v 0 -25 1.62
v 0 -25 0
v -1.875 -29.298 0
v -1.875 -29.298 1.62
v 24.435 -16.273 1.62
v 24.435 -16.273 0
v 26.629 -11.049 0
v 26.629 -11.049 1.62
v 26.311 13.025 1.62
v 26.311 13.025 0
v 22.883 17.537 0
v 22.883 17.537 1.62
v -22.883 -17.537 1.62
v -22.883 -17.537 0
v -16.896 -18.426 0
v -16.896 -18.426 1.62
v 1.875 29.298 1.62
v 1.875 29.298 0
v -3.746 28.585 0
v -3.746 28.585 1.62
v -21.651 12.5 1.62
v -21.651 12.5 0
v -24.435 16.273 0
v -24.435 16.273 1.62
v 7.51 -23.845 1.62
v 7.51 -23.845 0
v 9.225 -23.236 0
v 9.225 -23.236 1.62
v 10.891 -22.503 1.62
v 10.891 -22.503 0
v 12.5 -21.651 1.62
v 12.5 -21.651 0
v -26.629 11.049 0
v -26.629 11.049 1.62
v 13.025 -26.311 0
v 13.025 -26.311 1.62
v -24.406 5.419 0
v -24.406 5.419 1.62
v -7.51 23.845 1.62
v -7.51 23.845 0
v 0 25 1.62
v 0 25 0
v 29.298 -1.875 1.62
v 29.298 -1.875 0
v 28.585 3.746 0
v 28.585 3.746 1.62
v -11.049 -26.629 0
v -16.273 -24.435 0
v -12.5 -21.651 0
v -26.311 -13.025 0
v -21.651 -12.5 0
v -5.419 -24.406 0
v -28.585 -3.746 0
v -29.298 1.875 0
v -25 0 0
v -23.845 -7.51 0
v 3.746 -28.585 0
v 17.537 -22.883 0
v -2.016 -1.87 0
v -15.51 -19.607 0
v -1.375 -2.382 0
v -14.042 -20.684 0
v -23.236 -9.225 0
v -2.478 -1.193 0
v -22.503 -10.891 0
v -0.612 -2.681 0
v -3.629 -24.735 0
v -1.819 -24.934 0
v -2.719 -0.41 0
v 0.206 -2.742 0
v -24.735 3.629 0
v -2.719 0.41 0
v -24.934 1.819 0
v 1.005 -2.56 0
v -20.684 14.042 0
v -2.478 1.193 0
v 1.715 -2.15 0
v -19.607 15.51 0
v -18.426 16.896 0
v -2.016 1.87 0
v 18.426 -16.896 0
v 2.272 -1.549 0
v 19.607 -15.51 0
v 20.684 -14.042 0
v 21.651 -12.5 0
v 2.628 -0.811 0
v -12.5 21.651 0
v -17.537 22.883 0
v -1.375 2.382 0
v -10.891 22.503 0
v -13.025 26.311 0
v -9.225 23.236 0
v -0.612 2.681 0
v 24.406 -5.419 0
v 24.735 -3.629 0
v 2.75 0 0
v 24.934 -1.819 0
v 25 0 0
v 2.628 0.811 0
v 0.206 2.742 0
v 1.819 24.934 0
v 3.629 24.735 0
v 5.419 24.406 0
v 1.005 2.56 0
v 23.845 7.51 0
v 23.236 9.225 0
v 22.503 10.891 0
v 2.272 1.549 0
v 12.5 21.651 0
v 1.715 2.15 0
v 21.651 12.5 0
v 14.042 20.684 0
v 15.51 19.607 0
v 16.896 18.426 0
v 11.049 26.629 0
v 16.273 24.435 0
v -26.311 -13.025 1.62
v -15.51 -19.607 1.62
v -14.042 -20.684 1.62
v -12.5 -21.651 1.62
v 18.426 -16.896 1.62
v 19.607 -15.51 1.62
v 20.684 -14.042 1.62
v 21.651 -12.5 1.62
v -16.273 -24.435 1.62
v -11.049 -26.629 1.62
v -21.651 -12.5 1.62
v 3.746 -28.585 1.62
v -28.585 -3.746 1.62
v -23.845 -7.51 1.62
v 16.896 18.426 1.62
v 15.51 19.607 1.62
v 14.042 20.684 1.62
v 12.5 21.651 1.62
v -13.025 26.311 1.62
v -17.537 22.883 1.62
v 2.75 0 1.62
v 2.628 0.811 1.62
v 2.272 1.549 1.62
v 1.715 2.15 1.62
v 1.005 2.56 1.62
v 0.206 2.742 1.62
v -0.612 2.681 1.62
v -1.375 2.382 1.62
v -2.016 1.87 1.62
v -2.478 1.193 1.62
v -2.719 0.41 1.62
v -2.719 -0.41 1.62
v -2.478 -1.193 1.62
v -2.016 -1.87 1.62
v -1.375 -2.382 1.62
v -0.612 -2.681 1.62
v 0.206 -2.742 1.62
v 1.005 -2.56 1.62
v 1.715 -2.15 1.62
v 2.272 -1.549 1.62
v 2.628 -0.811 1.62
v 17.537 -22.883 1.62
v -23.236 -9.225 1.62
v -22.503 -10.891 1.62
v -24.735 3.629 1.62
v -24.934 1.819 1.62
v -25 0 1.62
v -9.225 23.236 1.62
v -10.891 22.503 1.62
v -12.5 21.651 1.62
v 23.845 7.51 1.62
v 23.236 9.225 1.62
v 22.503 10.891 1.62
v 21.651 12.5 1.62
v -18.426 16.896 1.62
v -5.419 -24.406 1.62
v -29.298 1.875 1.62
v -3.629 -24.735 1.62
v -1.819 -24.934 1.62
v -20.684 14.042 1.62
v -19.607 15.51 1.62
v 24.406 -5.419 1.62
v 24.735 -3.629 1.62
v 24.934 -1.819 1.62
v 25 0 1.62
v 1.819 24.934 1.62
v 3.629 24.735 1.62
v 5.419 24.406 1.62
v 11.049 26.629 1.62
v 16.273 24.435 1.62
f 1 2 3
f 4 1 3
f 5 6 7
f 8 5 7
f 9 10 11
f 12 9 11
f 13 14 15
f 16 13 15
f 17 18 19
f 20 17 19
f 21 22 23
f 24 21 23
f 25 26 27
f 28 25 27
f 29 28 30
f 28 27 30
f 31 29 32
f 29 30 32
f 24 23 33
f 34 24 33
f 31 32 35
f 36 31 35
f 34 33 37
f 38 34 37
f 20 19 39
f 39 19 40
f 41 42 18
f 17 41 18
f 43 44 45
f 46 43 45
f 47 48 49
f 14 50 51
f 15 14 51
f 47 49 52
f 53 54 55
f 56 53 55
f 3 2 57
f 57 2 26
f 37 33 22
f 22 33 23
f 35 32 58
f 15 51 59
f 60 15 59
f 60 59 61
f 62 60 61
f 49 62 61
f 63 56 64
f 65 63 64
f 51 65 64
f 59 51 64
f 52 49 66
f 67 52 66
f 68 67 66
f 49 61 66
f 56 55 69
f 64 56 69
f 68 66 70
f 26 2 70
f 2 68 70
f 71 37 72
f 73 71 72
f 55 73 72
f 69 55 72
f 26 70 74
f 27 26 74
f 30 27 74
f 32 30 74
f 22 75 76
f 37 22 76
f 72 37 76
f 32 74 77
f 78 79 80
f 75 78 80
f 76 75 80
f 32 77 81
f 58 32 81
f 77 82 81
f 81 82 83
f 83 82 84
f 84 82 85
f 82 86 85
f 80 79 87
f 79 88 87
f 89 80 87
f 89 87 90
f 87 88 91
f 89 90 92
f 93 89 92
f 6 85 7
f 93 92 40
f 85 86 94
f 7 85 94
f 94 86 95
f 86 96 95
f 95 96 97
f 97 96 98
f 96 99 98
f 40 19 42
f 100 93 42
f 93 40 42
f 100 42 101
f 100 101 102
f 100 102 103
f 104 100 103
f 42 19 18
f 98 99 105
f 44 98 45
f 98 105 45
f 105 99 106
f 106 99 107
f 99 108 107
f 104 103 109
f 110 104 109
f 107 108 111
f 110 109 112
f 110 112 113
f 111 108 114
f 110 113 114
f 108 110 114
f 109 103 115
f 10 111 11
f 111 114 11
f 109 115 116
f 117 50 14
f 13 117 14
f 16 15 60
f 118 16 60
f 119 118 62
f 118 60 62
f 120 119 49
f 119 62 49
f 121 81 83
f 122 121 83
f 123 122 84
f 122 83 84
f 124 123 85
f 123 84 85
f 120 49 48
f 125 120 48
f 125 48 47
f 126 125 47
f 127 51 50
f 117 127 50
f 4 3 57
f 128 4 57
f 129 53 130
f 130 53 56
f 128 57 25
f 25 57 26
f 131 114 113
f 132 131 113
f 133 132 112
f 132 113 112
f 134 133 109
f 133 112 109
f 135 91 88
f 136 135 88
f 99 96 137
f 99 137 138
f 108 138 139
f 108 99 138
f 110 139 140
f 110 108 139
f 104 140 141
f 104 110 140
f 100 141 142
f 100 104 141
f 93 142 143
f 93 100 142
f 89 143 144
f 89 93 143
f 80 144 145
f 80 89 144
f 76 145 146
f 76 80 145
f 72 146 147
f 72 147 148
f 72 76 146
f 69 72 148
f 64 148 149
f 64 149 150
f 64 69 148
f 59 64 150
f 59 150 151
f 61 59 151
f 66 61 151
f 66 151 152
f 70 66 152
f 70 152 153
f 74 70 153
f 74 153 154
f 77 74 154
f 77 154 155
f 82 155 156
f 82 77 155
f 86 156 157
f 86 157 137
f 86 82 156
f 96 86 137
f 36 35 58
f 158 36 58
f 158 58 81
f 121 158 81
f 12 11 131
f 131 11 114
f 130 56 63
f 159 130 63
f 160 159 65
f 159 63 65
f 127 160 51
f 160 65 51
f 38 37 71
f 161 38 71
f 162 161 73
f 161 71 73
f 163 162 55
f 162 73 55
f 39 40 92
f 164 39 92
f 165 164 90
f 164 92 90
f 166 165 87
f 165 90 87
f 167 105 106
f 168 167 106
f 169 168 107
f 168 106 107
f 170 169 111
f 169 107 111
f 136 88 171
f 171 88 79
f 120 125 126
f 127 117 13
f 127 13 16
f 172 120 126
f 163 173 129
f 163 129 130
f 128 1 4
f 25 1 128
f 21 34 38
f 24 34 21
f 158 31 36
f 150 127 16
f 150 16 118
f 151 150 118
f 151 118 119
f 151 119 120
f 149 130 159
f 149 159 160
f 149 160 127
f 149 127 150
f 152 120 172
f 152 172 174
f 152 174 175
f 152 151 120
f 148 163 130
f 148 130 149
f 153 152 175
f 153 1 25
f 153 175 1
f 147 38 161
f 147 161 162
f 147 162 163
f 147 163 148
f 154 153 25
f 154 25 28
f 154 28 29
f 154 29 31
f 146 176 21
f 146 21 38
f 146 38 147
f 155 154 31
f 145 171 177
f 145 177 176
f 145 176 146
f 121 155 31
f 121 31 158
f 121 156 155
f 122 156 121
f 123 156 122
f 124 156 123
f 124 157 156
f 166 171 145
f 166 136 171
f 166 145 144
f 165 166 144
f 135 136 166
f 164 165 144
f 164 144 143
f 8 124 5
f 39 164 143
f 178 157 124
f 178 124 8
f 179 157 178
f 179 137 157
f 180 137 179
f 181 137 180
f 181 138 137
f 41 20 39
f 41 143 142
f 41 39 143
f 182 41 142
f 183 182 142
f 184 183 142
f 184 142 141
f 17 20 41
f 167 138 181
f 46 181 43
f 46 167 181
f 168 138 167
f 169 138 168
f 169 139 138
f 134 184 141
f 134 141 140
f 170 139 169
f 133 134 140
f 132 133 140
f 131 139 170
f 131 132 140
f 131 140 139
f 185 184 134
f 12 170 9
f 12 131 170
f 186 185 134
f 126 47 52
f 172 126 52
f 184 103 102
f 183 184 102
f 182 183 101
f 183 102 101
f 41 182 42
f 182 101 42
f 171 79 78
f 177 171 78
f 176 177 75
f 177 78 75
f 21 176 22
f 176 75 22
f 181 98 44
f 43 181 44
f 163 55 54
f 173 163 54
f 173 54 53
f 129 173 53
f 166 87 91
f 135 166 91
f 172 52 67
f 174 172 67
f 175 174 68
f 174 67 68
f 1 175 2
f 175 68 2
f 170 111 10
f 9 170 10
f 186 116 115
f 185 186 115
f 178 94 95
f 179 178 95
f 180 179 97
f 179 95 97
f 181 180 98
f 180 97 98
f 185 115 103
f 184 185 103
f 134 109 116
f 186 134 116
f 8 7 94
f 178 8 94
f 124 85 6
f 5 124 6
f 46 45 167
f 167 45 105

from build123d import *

# Parameters (mm, degrees)
F0_R     = 2.75
F1_DEPTH = 1.62


with BuildPart() as f1:
    # F0 (on Top) → F1 (new body)
    with BuildSketch(Plane.XY):
        with BuildLine():
            ThreePointArc((24.405646, -5.418899), (24.850967, -2.725698), (25, 0))
            ThreePointArc((25, 0), (24.709654, 3.799081), (23.845358, 7.509919))
            ThreePointArc((23.845358, 7.509919), (22.884418, 10.06496), (21.650635, 12.5))
            ThreePointArc((21.650635, 12.5), (19.499647, 15.644928), (16.895727, 18.42646))
            ThreePointArc((16.895727, 18.42646), (14.786007, 20.15872), (12.5, 21.650635))
            ThreePointArc((12.5, 21.650635), (9.064726, 23.298728), (5.418899, 24.405646))
            ThreePointArc((5.418899, 24.405646), (2.725698, 24.850967), (0, 25))
            ThreePointArc((0, 25), (-3.799081, 24.709654), (-7.509919, 23.845358))
            ThreePointArc((-7.509919, 23.845358), (-10.06496, 22.884418), (-12.5, 21.650635))
            ThreePointArc((-12.5, 21.650635), (-15.644928, 19.499647), (-18.42646, 16.895727))
            ThreePointArc((-18.42646, 16.895727), (-20.15872, 14.786007), (-21.650635, 12.5))
            ThreePointArc((-21.650635, 12.5), (-23.298728, 9.064726), (-24.405646, 5.418899))
            ThreePointArc((-24.405646, 5.418899), (-24.850967, 2.725698), (-25, 0))
            ThreePointArc((-25, 0), (-24.709654, -3.799081), (-23.845358, -7.509919))
            ThreePointArc((-23.845358, -7.509919), (-22.884418, -10.06496), (-21.650635, -12.5))
            ThreePointArc((-21.650635, -12.5), (-19.499647, -15.644928), (-16.895727, -18.42646))
            ThreePointArc((-16.895727, -18.42646), (-14.786007, -20.15872), (-12.5, -21.650635))
            ThreePointArc((-12.5, -21.650635), (-9.064726, -23.298728), (-5.418899, -24.405646))
            ThreePointArc((-5.418899, -24.405646), (-2.725698, -24.850967), (0, -25))
            ThreePointArc((0, -25), (3.799081, -24.709654), (7.509919, -23.845358))
            ThreePointArc((7.509919, -23.845358), (10.06496, -22.884418), (12.5, -21.650635))
            ThreePointArc((12.5, -21.650635), (15.644928, -19.499647), (18.42646, -16.895727))
            ThreePointArc((18.42646, -16.895727), (20.15872, -14.786007), (21.650635, -12.5))
            ThreePointArc((21.650635, -12.5), (23.298728, -9.064726), (24.405646, -5.418899))
        make_face()
        Circle(F0_R, mode=Mode.SUBTRACT)
        with BuildLine():
            ThreePointArc((-7.509919, 23.845358), (-3.799081, 24.709654), (0, 25))
            Line((0, 25), (1.87548, 29.298078))
            Line((1.87548, 29.298078), (-3.745994, 28.585496))
            Line((-3.745994, 28.585496), (-7.509919, 23.845358))
        make_face()
        with BuildLine():
            ThreePointArc((-18.42646, 16.895727), (-15.644928, 19.499647), (-12.5, 21.650635))
            Line((-12.5, 21.650635), (-13.024826, 26.31062))
            Line((-13.024826, 26.31062), (-17.536874, 22.882769))
            Line((-17.536874, 22.882769), (-18.42646, 16.895727))
        make_face()
        with BuildLine():
            ThreePointArc((-24.405646, 5.418899), (-23.298728, 9.064726), (-21.650635, 12.5))
            Line((-21.650635, 12.5), (-24.43514, 16.273252))
            Line((-24.43514, 16.273252), (-26.628763, 11.048622))
            Line((-26.628763, 11.048622), (-24.405646, 5.418899))
        make_face()
        with BuildLine():
            Line((-28.585496, -3.745994), (-23.845358, -7.509919))
            ThreePointArc((-23.845358, -7.509919), (-24.709654, -3.799081), (-25, 0))
            Line((-25, 0), (-29.298078, 1.87548))
            Line((-29.298078, 1.87548), (-28.585496, -3.745994))
        make_face()
        with BuildLine():
            ThreePointArc((23.845358, 7.509919), (24.709654, 3.799081), (25, 0))
            Line((25, 0), (29.298078, -1.87548))
            Line((29.298078, -1.87548), (28.585496, 3.745994))
            Line((28.585496, 3.745994), (23.845358, 7.509919))
        make_face()
        with BuildLine():
            Line((26.628763, -11.048622), (24.405646, -5.418899))
            ThreePointArc((24.405646, -5.418899), (23.298728, -9.064726), (21.650635, -12.5))
            Line((21.650635, -12.5), (24.43514, -16.273252))
            Line((24.43514, -16.273252), (26.628763, -11.048622))
        make_face()
        with BuildLine():
            Line((-22.882769, -17.536874), (-16.895727, -18.42646))
            ThreePointArc((-16.895727, -18.42646), (-19.499647, -15.644928), (-21.650635, -12.5))
            Line((-21.650635, -12.5), (-26.31062, -13.024826))
            Line((-26.31062, -13.024826), (-22.882769, -17.536874))
        make_face()
        with BuildLine():
            Line((-11.048622, -26.628763), (-5.418899, -24.405646))
            ThreePointArc((-5.418899, -24.405646), (-9.064726, -23.298728), (-12.5, -21.650635))
            Line((-12.5, -21.650635), (-16.273252, -24.43514))
            Line((-16.273252, -24.43514), (-11.048622, -26.628763))
        make_face()
        with BuildLine():
            Line((3.745994, -28.585496), (7.509919, -23.845358))
            ThreePointArc((7.509919, -23.845358), (3.799081, -24.709654), (0, -25))
            Line((0, -25), (-1.87548, -29.298078))
            Line((-1.87548, -29.298078), (3.745994, -28.585496))
        make_face()
        with BuildLine():
            Line((17.536874, -22.882769), (18.42646, -16.895727))
            ThreePointArc((18.42646, -16.895727), (15.644928, -19.499647), (12.5, -21.650635))
            Line((12.5, -21.650635), (13.024826, -26.31062))
            Line((13.024826, -26.31062), (17.536874, -22.882769))
        make_face()
        with BuildLine():
            ThreePointArc((5.418899, 24.405646), (9.064726, 23.298728), (12.5, 21.650635))
            Line((12.5, 21.650635), (16.273252, 24.43514))
            Line((16.273252, 24.43514), (11.048622, 26.628763))
            Line((11.048622, 26.628763), (5.418899, 24.405646))
        make_face()
        with BuildLine():
            ThreePointArc((16.895727, 18.42646), (19.499647, 15.644928), (21.650635, 12.5))
            Line((21.650635, 12.5), (26.31062, 13.024826))
            Line((26.31062, 13.024826), (22.882769, 17.536874))
            Line((22.882769, 17.536874), (16.895727, 18.42646))
        make_face()
    extrude(amount=F1_DEPTH)


solid = f1.part
